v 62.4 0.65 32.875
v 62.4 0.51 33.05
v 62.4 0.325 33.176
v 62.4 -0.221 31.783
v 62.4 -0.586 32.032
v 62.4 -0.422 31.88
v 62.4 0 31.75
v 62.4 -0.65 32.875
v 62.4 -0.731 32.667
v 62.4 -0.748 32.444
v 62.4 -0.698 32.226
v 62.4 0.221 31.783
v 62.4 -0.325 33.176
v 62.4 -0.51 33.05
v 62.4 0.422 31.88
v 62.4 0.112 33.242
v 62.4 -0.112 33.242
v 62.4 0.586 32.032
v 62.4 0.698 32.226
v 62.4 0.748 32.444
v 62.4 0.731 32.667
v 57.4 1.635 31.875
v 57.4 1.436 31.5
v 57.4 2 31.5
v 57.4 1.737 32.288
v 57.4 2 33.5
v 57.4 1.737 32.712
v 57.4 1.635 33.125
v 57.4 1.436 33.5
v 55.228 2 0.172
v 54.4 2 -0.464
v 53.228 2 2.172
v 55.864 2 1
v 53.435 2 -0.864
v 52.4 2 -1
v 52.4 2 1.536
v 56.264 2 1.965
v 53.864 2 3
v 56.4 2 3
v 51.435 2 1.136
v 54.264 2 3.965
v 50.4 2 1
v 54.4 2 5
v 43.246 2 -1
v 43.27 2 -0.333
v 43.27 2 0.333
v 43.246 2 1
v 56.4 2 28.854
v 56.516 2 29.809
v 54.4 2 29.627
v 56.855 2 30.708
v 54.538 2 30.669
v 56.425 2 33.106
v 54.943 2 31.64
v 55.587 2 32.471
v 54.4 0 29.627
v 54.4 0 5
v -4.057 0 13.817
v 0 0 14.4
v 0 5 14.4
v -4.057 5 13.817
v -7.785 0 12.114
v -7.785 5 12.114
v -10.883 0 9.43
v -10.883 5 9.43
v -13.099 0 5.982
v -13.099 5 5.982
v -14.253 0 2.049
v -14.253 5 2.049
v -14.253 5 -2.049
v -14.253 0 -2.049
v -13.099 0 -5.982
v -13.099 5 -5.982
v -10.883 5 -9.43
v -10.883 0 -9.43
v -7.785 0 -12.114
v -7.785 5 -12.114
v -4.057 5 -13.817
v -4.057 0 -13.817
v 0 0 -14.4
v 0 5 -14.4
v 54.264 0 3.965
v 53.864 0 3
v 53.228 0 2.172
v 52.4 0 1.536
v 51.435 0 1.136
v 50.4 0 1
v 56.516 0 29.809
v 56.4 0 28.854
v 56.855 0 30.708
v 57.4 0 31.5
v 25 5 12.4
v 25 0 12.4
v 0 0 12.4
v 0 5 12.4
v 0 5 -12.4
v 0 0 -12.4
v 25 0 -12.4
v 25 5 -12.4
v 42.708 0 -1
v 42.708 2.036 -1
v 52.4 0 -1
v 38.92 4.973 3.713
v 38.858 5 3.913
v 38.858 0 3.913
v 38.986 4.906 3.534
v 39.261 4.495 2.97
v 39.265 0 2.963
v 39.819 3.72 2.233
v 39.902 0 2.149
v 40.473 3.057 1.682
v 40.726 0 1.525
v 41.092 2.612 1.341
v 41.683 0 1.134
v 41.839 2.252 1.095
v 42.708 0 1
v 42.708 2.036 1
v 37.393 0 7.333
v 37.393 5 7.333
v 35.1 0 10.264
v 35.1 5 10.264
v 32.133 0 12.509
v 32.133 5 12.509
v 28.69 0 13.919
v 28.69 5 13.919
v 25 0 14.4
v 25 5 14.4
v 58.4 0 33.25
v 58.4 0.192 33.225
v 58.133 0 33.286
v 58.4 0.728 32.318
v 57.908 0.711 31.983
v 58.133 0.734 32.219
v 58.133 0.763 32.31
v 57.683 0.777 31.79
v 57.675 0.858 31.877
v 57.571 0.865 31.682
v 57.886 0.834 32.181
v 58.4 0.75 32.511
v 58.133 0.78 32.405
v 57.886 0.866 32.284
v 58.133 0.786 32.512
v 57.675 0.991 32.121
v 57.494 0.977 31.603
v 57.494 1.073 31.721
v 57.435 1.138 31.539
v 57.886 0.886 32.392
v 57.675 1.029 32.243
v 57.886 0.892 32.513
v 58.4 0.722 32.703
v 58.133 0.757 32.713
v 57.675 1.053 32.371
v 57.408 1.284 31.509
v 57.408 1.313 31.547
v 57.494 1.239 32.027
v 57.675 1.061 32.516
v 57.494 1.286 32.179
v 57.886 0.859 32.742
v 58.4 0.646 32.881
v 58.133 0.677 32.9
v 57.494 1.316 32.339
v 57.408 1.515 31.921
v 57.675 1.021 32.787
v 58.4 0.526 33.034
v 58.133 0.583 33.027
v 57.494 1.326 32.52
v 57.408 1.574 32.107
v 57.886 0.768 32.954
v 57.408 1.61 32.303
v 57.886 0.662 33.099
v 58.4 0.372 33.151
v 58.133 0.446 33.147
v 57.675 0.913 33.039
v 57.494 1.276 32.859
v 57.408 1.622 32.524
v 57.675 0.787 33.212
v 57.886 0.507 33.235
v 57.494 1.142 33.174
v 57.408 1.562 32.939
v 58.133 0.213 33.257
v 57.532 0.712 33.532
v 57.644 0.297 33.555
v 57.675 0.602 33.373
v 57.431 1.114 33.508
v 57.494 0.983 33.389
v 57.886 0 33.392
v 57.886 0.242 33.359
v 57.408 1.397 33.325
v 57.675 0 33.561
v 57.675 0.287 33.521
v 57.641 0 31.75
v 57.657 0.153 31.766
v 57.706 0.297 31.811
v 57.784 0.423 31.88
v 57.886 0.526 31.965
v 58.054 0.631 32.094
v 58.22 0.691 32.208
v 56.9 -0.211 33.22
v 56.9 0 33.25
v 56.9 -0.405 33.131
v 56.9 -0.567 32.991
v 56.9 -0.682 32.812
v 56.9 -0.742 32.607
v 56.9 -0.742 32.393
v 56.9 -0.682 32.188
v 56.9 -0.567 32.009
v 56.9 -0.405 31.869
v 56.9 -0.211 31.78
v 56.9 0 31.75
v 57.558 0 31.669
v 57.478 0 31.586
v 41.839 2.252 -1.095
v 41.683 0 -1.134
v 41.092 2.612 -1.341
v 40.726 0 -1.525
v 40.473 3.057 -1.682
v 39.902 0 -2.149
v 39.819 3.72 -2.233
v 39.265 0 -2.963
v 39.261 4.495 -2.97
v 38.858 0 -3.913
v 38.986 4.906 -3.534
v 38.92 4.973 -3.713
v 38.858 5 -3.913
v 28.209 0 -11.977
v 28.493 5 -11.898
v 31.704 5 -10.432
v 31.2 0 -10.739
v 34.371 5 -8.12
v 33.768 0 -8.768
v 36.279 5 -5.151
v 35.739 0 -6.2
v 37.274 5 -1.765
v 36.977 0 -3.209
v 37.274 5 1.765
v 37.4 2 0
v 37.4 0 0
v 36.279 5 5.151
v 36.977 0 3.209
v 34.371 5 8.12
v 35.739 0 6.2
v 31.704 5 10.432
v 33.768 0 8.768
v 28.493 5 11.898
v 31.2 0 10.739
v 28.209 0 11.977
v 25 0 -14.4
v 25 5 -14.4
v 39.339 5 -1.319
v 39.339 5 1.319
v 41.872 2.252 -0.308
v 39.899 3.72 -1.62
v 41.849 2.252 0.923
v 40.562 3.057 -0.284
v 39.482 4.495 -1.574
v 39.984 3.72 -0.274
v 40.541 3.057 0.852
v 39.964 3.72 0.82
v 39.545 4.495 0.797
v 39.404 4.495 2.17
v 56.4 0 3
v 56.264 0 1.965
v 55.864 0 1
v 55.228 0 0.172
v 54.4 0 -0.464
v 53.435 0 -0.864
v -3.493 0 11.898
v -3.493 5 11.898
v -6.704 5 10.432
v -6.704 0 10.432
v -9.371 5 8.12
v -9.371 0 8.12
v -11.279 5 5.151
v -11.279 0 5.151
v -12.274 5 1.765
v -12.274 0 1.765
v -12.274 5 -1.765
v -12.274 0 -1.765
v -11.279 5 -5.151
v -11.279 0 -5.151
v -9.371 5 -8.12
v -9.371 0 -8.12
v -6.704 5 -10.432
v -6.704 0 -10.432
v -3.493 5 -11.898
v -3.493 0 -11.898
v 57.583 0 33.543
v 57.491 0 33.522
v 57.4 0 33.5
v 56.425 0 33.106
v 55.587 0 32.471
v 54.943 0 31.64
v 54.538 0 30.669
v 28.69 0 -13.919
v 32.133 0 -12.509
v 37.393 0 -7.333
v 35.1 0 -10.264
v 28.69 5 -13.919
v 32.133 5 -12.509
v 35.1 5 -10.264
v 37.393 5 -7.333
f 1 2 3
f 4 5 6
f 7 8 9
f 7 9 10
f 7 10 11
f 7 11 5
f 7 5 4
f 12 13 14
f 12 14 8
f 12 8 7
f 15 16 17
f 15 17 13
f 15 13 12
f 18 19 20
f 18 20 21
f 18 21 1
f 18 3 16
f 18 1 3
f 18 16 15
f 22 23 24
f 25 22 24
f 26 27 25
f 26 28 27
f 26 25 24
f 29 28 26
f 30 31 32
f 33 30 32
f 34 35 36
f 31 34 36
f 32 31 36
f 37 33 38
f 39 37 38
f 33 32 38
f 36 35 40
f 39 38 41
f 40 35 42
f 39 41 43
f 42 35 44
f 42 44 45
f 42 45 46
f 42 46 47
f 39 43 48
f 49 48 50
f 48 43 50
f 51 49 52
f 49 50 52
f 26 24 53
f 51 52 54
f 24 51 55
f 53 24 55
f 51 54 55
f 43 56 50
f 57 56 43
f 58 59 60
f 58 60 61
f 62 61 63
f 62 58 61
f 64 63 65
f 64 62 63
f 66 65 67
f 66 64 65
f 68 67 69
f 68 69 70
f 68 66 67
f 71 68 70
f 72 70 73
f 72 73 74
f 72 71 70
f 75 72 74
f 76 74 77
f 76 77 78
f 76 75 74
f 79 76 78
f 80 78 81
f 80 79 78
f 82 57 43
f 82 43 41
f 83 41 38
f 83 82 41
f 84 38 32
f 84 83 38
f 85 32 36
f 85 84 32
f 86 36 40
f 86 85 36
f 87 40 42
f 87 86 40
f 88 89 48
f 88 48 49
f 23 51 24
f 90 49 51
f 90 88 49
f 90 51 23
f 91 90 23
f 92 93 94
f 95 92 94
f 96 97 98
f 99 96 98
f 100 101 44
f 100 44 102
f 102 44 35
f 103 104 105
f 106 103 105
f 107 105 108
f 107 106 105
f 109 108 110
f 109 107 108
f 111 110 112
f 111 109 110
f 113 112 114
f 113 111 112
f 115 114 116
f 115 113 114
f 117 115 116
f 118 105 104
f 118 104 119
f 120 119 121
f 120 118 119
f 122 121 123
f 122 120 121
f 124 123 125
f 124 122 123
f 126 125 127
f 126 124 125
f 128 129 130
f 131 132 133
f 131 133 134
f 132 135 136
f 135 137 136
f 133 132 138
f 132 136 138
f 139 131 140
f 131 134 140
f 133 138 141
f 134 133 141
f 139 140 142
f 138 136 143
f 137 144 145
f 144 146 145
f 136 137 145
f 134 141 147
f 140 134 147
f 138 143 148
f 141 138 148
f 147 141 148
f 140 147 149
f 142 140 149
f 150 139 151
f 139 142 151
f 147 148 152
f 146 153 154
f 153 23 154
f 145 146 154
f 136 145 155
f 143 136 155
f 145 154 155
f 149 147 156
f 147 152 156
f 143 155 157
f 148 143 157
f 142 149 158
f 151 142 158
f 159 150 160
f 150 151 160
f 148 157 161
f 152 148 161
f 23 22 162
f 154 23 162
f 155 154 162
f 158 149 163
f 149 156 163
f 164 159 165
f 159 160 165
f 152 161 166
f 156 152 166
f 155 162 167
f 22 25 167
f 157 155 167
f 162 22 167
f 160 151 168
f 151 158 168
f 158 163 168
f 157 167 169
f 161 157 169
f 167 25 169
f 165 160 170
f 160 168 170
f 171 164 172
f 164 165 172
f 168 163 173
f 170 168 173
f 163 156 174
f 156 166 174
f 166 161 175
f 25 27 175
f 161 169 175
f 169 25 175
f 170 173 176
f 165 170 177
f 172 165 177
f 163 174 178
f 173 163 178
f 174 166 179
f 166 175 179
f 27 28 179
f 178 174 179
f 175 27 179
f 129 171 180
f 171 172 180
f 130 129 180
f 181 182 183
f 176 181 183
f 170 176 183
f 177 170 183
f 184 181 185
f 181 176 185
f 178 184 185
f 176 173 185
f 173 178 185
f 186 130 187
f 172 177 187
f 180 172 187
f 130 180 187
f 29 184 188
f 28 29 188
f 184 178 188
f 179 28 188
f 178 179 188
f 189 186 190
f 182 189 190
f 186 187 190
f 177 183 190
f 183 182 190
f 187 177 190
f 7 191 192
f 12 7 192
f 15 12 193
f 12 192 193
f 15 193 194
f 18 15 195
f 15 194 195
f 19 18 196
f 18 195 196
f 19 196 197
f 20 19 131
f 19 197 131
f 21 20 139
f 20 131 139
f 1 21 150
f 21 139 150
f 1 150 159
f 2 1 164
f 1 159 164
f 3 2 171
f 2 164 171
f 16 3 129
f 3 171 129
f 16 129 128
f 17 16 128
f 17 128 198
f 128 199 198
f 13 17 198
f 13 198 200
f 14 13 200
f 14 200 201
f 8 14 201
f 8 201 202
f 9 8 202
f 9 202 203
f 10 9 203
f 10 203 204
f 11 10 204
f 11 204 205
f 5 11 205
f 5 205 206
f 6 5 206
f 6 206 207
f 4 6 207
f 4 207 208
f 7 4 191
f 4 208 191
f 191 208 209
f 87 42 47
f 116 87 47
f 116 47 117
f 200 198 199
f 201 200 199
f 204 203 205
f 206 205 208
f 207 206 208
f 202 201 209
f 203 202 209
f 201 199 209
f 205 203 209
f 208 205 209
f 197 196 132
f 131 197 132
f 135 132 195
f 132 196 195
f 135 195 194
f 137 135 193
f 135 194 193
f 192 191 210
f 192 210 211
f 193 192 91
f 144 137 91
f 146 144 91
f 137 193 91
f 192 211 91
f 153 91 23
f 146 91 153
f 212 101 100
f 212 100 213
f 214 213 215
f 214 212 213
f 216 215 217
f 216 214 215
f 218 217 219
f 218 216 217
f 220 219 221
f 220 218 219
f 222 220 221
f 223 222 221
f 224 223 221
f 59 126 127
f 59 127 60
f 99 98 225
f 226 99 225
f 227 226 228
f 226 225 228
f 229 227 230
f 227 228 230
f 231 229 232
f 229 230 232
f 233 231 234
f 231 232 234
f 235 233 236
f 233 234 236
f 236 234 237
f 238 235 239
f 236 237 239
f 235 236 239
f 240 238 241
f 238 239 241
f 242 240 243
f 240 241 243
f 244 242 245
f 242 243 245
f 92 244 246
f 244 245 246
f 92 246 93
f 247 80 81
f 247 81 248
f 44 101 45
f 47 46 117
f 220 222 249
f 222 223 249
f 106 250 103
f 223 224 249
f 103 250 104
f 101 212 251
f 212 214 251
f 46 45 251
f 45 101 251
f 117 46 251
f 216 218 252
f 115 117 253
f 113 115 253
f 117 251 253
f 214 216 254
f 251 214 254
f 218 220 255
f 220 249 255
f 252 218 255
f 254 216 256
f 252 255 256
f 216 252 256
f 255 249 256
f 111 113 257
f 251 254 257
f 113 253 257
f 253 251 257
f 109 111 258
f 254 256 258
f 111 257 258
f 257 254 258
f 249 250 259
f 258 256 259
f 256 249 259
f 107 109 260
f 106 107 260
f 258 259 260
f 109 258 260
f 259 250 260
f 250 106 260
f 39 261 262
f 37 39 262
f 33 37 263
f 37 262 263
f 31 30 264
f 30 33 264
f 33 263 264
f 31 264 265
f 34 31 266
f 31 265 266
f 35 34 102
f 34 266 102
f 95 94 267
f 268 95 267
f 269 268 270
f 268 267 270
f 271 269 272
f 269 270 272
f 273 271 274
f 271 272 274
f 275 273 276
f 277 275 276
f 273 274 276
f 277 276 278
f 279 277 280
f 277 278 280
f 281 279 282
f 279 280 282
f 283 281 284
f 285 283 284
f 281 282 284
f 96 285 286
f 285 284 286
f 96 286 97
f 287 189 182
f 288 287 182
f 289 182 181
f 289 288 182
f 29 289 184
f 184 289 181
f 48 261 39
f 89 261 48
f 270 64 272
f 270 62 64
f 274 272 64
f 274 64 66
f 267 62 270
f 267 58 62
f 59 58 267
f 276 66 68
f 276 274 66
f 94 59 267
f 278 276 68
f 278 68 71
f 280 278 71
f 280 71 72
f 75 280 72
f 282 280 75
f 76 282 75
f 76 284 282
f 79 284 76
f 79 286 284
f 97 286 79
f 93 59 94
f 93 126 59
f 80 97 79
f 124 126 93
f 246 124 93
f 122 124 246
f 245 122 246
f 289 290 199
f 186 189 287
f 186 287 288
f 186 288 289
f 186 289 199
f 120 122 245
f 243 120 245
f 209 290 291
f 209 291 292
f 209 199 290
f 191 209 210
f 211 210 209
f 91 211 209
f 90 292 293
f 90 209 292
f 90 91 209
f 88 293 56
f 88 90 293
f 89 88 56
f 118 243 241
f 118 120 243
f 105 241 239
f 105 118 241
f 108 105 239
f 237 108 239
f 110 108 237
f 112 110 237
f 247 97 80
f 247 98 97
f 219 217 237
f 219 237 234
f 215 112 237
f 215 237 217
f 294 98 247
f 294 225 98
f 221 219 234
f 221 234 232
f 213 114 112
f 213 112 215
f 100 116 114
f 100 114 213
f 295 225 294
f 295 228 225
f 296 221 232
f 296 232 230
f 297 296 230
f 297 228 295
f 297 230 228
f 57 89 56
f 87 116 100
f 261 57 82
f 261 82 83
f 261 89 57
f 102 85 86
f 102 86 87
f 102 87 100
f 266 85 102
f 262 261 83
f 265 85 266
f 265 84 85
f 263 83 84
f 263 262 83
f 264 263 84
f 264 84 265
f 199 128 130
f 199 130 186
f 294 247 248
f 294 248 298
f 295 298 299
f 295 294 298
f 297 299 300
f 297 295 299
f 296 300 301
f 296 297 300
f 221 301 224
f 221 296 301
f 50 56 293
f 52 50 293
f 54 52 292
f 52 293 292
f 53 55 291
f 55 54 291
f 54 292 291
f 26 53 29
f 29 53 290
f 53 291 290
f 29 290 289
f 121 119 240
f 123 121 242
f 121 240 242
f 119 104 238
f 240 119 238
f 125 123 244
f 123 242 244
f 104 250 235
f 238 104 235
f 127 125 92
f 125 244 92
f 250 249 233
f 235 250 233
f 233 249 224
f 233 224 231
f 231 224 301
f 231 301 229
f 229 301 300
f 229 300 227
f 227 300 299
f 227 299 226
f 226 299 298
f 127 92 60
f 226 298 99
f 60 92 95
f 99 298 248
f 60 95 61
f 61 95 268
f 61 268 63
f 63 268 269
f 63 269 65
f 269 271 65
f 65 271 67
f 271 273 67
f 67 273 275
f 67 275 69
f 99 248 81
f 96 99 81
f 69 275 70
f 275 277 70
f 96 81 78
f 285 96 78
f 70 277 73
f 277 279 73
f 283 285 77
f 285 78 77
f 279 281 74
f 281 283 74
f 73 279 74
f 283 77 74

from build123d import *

# Parameters (mm, degrees)
BOSS_EXTRUDE1_DEPTH      = 5
SKETCH2_W                = 1
SKETCH2_H                = 2
SKETCH2_W_2              = 2
SKETCH2_H_2              = 30.5
BOSS_EXTRUDE2_DEPTH      = 2
FILLET1_R                = 4
BOSS_EXTRUDE3_DEPTH      = 5
BOSS_EXTRUDE3_DEPTH_BACK = 0.5
SKETCH3_R                = 0.75
FILLET3_R                = 1


with BuildPart() as part:
    # Sketch1 → Boss-Extrude1 (new body)
    with BuildSketch(Plane(origin=(0, 0, 0), x_dir=(1, 0, 0), z_dir=(0, 1, 0))):
        with BuildLine():
            Line((0, 14.4), (25, 14.4))
            ThreePointArc((25, 14.4), (39.4, 0), (25, -14.4))
            Line((25, -14.4), (0, -14.4))
            ThreePointArc((0, -14.4), (-14.4, 0), (0, 14.4))
        make_face()
        with BuildLine():
            Line((0, 12.4), (25, 12.4))
            ThreePointArc((25, 12.4), (37.4, 0), (25, -12.4))
            Line((25, -12.4), (0, -12.4))
            ThreePointArc((0, -12.4), (-12.4, 0), (0, 12.4))
        make_face(mode=Mode.SUBTRACT)
    extrude(amount=BOSS_EXTRUDE1_DEPTH)

    # Sketch2 → Boss-Extrude2 (add)
    with BuildSketch(Plane.XZ):
        with Locations((56.9, 32.5)):
            Rectangle(SKETCH2_W, SKETCH2_H)
        with Locations((55.4, 32.5)):
            Rectangle(SKETCH2_W_2, SKETCH2_H)
        with Locations((55.4, 16.25)):
            Rectangle(SKETCH2_W_2, SKETCH2_H_2)
        with BuildLine():
            Line((39.365235814, -1), (54.4, -1))
            Line((54.4, -1), (54.4, 1))
            Line((54.4, 1), (39.365235814, 1))
            ThreePointArc((39.365235814, 1), (39.4, 0), (39.365235814, -1))
        make_face()
        with Locations((55.4, 0)):
            Rectangle(SKETCH2_W_2, SKETCH2_H)
        with BuildLine():
            Line((37.4, -1), (39.365235814, -1))
            ThreePointArc((39.365235814, -1), (39.4, 0), (39.365235814, 1))
            Line((39.365235814, 1), (37.4, 1))
            Line((37.4, 1), (37.4, -1))
        make_face()
    extrude(amount=-BOSS_EXTRUDE2_DEPTH)

    # Fillet1
    # the kernel refuses this fillet: 4 mm, written as the material it adds along each edge
    with BuildSketch(Plane(origin=(25, 2, 0), x_dir=(0.7371891614816782, 0, -0.6756864214959037), z_dir=(-0.6756864214959037, 0, -0.7371891614816782))) as fillet1_piece_1_section:
        with BuildLine():
            CenterArc((18.272983346, -4), FILLET1_R, 90, 75.522487814)
            Line((18.272983346, 0), (18.272983346, 0.08))
            Line((18.272983346, 0.08), (14.4, 0.08))
            Line((14.4, 0.08), (14.32, 0))
            ThreePointArc((14.32, 0), (14.32, -1.5), (14.322540333, -2.98))
            Line((14.322540333, -2.98), (14.4, -3))
        make_face()
    fillet1_piece_1 = revolve(axis=Axis((25, 2, 0), (0, -1, 0)), revolution_arc=85.014954966, mode=Mode.PRIVATE)
    fillet1_piece_1 = split(fillet1_piece_1, bisect_by=Plane(origin=(40.301586348, 2.758397987, -1), z_dir=(0, 0, 1)), keep=Keep.TOP, mode=Mode.PRIVATE)
    fillet1_piece_1 = split(fillet1_piece_1, bisect_by=Plane(origin=(40.301586348, 2.758397987, 1), z_dir=(0, 0, -1)), keep=Keep.TOP, mode=Mode.PRIVATE)
    add(fillet1_piece_1)
    with BuildSketch(Plane(origin=(39.365235814, 2, 1), x_dir=(-0.17149804582148107, 0, 0.9851844600273663), z_dir=(0, -1, 0))) as fillet1_piece_2:
        with BuildLine():
            CenterArc((3.367524545, -3.978862537), FILLET1_R, 95.892851455, 74.232218513)
            Line((-0.573213295, -3.292870354), (-0.652028052, -3.27915051))
            Line((-0.652028052, -3.27915051), (-0.078814757, 0.013719844))
            Line((-0.078814757, 0.013719844), (0.008213474, 0.079577251))
            ThreePointArc((0.008213474, 0.079577251), (1.47842541, 0.003905135), (2.948637345, 0.079577251))
            Line((2.948637345, 0.079577251), (2.95685082, 0))
        make_face()
    extrude(amount=2)
    with BuildSketch(Plane(origin=(39.365235814, 2, -1), x_dir=(-0.17149804582148342, 0, -0.9851844600273658), z_dir=(0, -1, 0))) as fillet1_piece_3:
        with BuildLine():
            CenterArc((3.367524545, 3.978862537), FILLET1_R, 189.874930032, 74.232218513)
            Line((-0.573213295, 3.292870354), (-0.652028052, 3.27915051))
            Line((-0.652028052, 3.27915051), (-0.078814757, -0.013719844))
            Line((-0.078814757, -0.013719844), (0.008213474, -0.079577251))
            ThreePointArc((0.008213474, -0.079577251), (1.47842541, -0.003905135), (2.948637345, -0.079577251))
            Line((2.948637345, -0.079577251), (2.95685082, 0))
        make_face()
    extrude(amount=2)
    with BuildSketch(Plane(origin=(54.4, 0, 1), x_dir=(-1, 0, 0), z_dir=(0, 1, 0))) as fillet1_piece_4:
        with BuildLine():
            CenterArc((FILLET1_R, FILLET1_R), FILLET1_R, 180, 90)
            Line((0, FILLET1_R), (-FILLET1_R * 0.02, FILLET1_R))
            Line((-FILLET1_R * 0.02, FILLET1_R), (-FILLET1_R * 0.02, -FILLET1_R * 0.02))
            Line((-FILLET1_R * 0.02, -FILLET1_R * 0.02), (FILLET1_R, -FILLET1_R * 0.02))
            Line((FILLET1_R, -FILLET1_R * 0.02), (FILLET1_R, 0))
        make_face()
    extrude(amount=2)
    with BuildSketch(Plane(origin=(56.4, 0, 31.5), x_dir=(0, 0, -1), z_dir=(0, 1, 0))) as fillet1_piece_5:
        with BuildLine():
            CenterArc((2.645751311, -4), FILLET1_R, 90, 41.409622109)
            Line((0, -1), (-0.052915026, -0.94))
            ThreePointArc((-0.052915026, -0.94), (-0.08, -0.5), (-0.08, 0))
            Line((-0.08, 0), (0, 0.08))
            Line((0, 0.08), (2.645751311, 0.08))
            Line((2.645751311, 0.08), (2.645751311, 0))
        make_face()
    extrude(amount=2)
    with BuildSketch(Plane(origin=(39.365235814, 10.355974154, -1), x_dir=(-0.1714980458214834, 0, -0.9851844600273658), z_dir=(0, -1, 0))) as fillet1_piece_6a_section:
        with BuildLine():
            CenterArc((3.367524545, 3.978862537), FILLET1_R, 189.874930032, 74.232218513)
            Line((-0.573213295, 3.292870354), (-0.652028052, 3.27915051))
            Line((-0.652028052, 3.27915051), (-0.078814757, -0.013719844))
            Line((-0.078814757, -0.013719844), (0.008213474, -0.079577251))
            ThreePointArc((0.008213474, -0.079577251), (1.47842541, -0.003905135), (2.948637345, -0.079577251))
            Line((2.948637345, -0.079577251), (2.95685082, 0))
        make_face()
    fillet1_piece_6a = extrude(amount=10.355974154, mode=Mode.PRIVATE)
    fillet1_piece_6a = split(fillet1_piece_6a, bisect_by=Plane(origin=(40.057221624, 5, -1.646357347), z_dir=(0, -1, 0)), keep=Keep.TOP, mode=Mode.PRIVATE)
    fillet1_piece_6a = split(fillet1_piece_6a, bisect_by=Plane(origin=(40.057221624, 2, -1.646357347), z_dir=(0, 1, 0)), keep=Keep.TOP, mode=Mode.PRIVATE)
    with BuildSketch(Plane(origin=(25, 2, 0), x_dir=(0.7371891614816782, 0, -0.6756864214959037), z_dir=(-0.6756864214959037, 0, -0.7371891614816782))) as fillet1_piece_6b_section:
        with BuildLine():
            CenterArc((18.272983346, -4), FILLET1_R, 90, 75.522487814)
            Line((18.272983346, 0), (18.272983346, 0.08))
            Line((18.272983346, 0.08), (14.4, 0.08))
            Line((14.4, 0.08), (14.32, 0))
            ThreePointArc((14.32, 0), (14.32, -1.5), (14.322540333, -2.98))
            Line((14.322540333, -2.98), (14.4, -3))
        make_face()
    fillet1_piece_6b = revolve(axis=Axis((25, 2, 0), (0, -1, 0)), revolution_arc=85.014954966, mode=Mode.PRIVATE)
    fillet1_piece_6b = split(fillet1_piece_6b, bisect_by=Plane(origin=(38.861424428, 2.733448244, -1), z_dir=(0, 0, -1)), keep=Keep.TOP, mode=Mode.PRIVATE)
    fillet1_piece_6 = fillet1_piece_6a & fillet1_piece_6b
    add(fillet1_piece_6)
    with BuildSketch(Plane(origin=(25, 2, 0), x_dir=(0.7371891614816782, 0, -0.6756864214959037), z_dir=(-0.6756864214959037, 0, -0.7371891614816782))) as fillet1_piece_7a_section:
        with BuildLine():
            CenterArc((18.272983346, -4), FILLET1_R, 90, 75.522487814)
            Line((18.272983346, 0), (18.272983346, 0.08))
            Line((18.272983346, 0.08), (14.4, 0.08))
            Line((14.4, 0.08), (14.32, 0))
            ThreePointArc((14.32, 0), (14.32, -1.5), (14.322540333, -2.98))
            Line((14.322540333, -2.98), (14.4, -3))
        make_face()
    fillet1_piece_7a = revolve(axis=Axis((25, 2, 0), (0, -1, 0)), revolution_arc=85.014954966, mode=Mode.PRIVATE)
    fillet1_piece_7a = split(fillet1_piece_7a, bisect_by=Plane(origin=(38.861423807, 2.733448455, 1), z_dir=(0, 0, 1)), keep=Keep.TOP, mode=Mode.PRIVATE)
    with BuildSketch(Plane(origin=(39.365235814, 10.355974154, 1), x_dir=(-0.17149804582148107, 0, 0.9851844600273663), z_dir=(0, -1, 0))) as fillet1_piece_7b_section:
        with BuildLine():
            CenterArc((3.367524545, -3.978862537), FILLET1_R, 95.892851455, 74.232218513)
            Line((-0.573213295, -3.292870354), (-0.652028052, -3.27915051))
            Line((-0.652028052, -3.27915051), (-0.078814757, 0.013719844))
            Line((-0.078814757, 0.013719844), (0.008213474, 0.079577251))
            ThreePointArc((0.008213474, 0.079577251), (1.47842541, 0.003905135), (2.948637345, 0.079577251))
            Line((2.948637345, 0.079577251), (2.95685082, 0))
        make_face()
    fillet1_piece_7b = extrude(amount=10.355974154, mode=Mode.PRIVATE)
    fillet1_piece_7b = split(fillet1_piece_7b, bisect_by=Plane(origin=(40.057221624, 5, 1.646357347), z_dir=(0, -1, 0)), keep=Keep.TOP, mode=Mode.PRIVATE)
    fillet1_piece_7b = split(fillet1_piece_7b, bisect_by=Plane(origin=(40.057221624, 2, 1.646357347), z_dir=(0, 1, 0)), keep=Keep.TOP, mode=Mode.PRIVATE)
    fillet1_piece_7 = fillet1_piece_7a & fillet1_piece_7b
    add(fillet1_piece_7)
    # the kernel refuses this fillet: 4 mm, written as the material it takes off along each edge
    with BuildSketch(Plane(origin=(56.4, -10, -1), x_dir=(-1, 0, 0), z_dir=(0, 1, 0))) as fillet1_2_piece_1:
        with BuildLine():
            CenterArc((FILLET1_R, FILLET1_R), FILLET1_R, 180, 90)
            Line((0, FILLET1_R), (-FILLET1_R * 0.02, FILLET1_R))
            Line((-FILLET1_R * 0.02, FILLET1_R), (-FILLET1_R * 0.02, -FILLET1_R * 0.02))
            Line((-FILLET1_R * 0.02, -FILLET1_R * 0.02), (FILLET1_R, -FILLET1_R * 0.02))
            Line((FILLET1_R, -FILLET1_R * 0.02), (FILLET1_R, 0))
        make_face()
    extrude(amount=22, mode=Mode.SUBTRACT)
    with BuildSketch(Plane(origin=(54.4, -9.682458366, 33.5), x_dir=(1, 0, 0), z_dir=(0, 1, 0))) as fillet1_2_piece_2:
        with BuildLine():
            CenterArc((4, 3.872983346), FILLET1_R, 180, 75.522487814)
            Line((0, 3.872983346), (-0.08, 3.872983346))
            Line((-0.08, 3.872983346), (-0.08, 0))
            Line((-0.08, 0), (0, -0.08))
            ThreePointArc((0, -0.08), (1.5, -0.08), (2.98, -0.077459667))
            Line((2.98, -0.077459667), (3, 0))
        make_face()
    extrude(amount=21.364916731, mode=Mode.SUBTRACT)

    # Sketch3 → Boss-Extrude3 (add, two sides: drawn at the far end of the back side and taken through both)
    with BuildSketch(Plane(origin=(57.4, 0, 0), x_dir=(0, 0, -1), z_dir=(1, 0, 0)).offset(-BOSS_EXTRUDE3_DEPTH_BACK)):
        with Locations((-32.5, 0)):
            Circle(SKETCH3_R)
    extrude(amount=BOSS_EXTRUDE3_DEPTH + BOSS_EXTRUDE3_DEPTH_BACK)

    # Fillet3
    # the kernel refuses this fillet: 1 mm, written as the material it adds along each edge
    with BuildSketch(Plane(origin=(57.4, 0, 32.5), x_dir=(0, 0, -1), z_dir=(0, -1, 0))) as fillet3_piece_1_section:
        with BuildLine():
            CenterArc((0.75 + FILLET3_R, FILLET3_R), FILLET3_R, 180, 90)
            Line((0.75, FILLET3_R), (0.75, 0))
            Line((0.75, 0), (0.75 + FILLET3_R, 0))
        make_face()
    fillet3_piece_1 = revolve(axis=Axis((57.4, 0, 32.5), (1, 0, 0)), revolution_arc=180, mode=Mode.PRIVATE)
    fillet3_piece_1 = fillet3_piece_1 & Plane(origin=(58.4, 0.745327828, 29.627016654), x_dir=(1, 0, 0), z_dir=(0, -1, 0)) * Cylinder(4, 7, mode=Mode.PRIVATE)
    fillet3_piece_1 = fillet3_piece_1 - Plane(origin=(60.4, 0.745327828, 28.854248689), x_dir=(0, 0, -1), z_dir=(0, -1, 0)) * Cylinder(4, 7, mode=Mode.PRIVATE)
    add(fillet3_piece_1)


solid = part.part
